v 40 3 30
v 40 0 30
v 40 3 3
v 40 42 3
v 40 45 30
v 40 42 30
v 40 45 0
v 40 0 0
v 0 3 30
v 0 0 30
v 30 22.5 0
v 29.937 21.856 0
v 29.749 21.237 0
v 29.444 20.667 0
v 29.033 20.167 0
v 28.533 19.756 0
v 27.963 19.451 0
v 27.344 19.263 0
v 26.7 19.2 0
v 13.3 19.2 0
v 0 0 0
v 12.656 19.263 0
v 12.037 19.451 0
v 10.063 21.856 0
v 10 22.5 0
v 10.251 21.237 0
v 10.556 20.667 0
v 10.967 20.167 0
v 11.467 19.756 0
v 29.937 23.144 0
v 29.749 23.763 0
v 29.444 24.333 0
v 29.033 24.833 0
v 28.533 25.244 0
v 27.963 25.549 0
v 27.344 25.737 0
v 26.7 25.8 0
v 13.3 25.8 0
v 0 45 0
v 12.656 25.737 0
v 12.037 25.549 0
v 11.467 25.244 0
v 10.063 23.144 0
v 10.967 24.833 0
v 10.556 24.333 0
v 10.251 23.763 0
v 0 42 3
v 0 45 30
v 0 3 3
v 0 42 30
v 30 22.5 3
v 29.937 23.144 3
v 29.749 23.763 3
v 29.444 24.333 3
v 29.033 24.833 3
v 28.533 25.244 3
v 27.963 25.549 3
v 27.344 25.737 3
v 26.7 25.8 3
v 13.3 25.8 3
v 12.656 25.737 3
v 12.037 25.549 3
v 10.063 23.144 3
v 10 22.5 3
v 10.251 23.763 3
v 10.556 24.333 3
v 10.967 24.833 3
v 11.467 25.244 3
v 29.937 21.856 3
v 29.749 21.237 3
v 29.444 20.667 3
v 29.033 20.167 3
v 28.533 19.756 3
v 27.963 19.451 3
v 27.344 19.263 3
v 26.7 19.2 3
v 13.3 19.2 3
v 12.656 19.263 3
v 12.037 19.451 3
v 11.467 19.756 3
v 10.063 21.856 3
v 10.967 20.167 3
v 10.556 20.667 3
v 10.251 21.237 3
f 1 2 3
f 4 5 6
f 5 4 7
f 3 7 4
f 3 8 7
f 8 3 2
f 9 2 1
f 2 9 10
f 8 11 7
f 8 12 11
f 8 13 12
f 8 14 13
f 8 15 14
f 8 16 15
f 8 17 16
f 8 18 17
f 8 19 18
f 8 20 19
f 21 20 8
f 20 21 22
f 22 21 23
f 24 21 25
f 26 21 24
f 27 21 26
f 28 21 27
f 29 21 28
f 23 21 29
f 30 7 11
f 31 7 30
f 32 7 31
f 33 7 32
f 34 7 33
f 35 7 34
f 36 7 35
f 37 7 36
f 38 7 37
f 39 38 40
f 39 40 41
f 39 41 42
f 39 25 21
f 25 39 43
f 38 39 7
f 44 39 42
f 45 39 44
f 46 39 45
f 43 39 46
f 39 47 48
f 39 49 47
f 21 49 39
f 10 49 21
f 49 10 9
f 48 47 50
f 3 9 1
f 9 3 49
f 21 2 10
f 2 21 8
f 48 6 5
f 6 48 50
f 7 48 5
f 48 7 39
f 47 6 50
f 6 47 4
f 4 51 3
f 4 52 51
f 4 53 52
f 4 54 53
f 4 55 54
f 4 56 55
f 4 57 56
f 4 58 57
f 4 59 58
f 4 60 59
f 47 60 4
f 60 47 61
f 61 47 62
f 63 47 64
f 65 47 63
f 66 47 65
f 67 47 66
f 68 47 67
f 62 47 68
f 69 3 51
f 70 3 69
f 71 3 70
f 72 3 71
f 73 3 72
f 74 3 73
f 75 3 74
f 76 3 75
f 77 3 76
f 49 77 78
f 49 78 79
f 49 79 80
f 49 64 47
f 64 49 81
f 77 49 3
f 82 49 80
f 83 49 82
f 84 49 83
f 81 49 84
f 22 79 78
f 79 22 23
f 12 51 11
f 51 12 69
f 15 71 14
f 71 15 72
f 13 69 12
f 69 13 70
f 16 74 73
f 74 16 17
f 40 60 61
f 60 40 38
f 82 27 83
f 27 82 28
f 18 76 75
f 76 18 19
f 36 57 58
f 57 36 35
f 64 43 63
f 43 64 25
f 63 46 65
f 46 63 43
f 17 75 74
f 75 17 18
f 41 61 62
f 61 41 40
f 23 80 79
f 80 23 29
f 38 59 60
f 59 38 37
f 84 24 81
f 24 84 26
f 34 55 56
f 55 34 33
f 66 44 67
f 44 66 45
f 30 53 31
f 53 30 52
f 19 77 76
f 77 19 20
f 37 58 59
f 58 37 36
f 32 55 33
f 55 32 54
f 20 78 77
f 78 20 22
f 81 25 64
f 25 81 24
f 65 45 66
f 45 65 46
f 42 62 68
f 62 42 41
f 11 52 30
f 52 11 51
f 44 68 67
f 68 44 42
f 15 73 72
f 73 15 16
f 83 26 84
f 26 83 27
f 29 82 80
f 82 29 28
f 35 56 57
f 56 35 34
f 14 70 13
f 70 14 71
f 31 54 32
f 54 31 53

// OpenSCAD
$fn = 32;

// ----------------------------------------------------------------------
// U-bracket: 40 x 45 x 30 mm
// ----------------------------------------------------------------------

// --- parameters (mm) ---
base_len = 40;            // outer length, X
channel_w = 45;           // outer width, Y
upright_h = 30;           // upright height, Z
mat_t = 3;                // wall thickness
hole_d = 6.6;             // clearance for M6
slot_l = 20;              // slot length

module hole_z(px, py) {
  translate([px, py, -0.5]) cylinder(h = mat_t + 1, d = hole_d);
}
module hole_y_pz(pz) {
  /* through both uprights along Y */
  translate([0, -0.5, pz]) rotate([-90, 0, 0]) cylinder(h = channel_w + 1, d = hole_d);
}
module slot_z(px, py) {
  hull() {
    translate([px - (slot_l - hole_d) / 2, py, -0.5]) cylinder(h = mat_t + 1, d = hole_d);
    translate([px + (slot_l - hole_d) / 2, py, -0.5]) cylinder(h = mat_t + 1, d = hole_d);
  }
}

module base() {
  cube([base_len, channel_w, mat_t]);
}

module uprights() {
  cube([base_len, mat_t, upright_h]);
  translate([0, channel_w - mat_t, 0]) cube([base_len, mat_t, upright_h]);
}

difference() {
  union() {
    base();
    uprights();
  }
  slot_z(20, 22.5);
}
